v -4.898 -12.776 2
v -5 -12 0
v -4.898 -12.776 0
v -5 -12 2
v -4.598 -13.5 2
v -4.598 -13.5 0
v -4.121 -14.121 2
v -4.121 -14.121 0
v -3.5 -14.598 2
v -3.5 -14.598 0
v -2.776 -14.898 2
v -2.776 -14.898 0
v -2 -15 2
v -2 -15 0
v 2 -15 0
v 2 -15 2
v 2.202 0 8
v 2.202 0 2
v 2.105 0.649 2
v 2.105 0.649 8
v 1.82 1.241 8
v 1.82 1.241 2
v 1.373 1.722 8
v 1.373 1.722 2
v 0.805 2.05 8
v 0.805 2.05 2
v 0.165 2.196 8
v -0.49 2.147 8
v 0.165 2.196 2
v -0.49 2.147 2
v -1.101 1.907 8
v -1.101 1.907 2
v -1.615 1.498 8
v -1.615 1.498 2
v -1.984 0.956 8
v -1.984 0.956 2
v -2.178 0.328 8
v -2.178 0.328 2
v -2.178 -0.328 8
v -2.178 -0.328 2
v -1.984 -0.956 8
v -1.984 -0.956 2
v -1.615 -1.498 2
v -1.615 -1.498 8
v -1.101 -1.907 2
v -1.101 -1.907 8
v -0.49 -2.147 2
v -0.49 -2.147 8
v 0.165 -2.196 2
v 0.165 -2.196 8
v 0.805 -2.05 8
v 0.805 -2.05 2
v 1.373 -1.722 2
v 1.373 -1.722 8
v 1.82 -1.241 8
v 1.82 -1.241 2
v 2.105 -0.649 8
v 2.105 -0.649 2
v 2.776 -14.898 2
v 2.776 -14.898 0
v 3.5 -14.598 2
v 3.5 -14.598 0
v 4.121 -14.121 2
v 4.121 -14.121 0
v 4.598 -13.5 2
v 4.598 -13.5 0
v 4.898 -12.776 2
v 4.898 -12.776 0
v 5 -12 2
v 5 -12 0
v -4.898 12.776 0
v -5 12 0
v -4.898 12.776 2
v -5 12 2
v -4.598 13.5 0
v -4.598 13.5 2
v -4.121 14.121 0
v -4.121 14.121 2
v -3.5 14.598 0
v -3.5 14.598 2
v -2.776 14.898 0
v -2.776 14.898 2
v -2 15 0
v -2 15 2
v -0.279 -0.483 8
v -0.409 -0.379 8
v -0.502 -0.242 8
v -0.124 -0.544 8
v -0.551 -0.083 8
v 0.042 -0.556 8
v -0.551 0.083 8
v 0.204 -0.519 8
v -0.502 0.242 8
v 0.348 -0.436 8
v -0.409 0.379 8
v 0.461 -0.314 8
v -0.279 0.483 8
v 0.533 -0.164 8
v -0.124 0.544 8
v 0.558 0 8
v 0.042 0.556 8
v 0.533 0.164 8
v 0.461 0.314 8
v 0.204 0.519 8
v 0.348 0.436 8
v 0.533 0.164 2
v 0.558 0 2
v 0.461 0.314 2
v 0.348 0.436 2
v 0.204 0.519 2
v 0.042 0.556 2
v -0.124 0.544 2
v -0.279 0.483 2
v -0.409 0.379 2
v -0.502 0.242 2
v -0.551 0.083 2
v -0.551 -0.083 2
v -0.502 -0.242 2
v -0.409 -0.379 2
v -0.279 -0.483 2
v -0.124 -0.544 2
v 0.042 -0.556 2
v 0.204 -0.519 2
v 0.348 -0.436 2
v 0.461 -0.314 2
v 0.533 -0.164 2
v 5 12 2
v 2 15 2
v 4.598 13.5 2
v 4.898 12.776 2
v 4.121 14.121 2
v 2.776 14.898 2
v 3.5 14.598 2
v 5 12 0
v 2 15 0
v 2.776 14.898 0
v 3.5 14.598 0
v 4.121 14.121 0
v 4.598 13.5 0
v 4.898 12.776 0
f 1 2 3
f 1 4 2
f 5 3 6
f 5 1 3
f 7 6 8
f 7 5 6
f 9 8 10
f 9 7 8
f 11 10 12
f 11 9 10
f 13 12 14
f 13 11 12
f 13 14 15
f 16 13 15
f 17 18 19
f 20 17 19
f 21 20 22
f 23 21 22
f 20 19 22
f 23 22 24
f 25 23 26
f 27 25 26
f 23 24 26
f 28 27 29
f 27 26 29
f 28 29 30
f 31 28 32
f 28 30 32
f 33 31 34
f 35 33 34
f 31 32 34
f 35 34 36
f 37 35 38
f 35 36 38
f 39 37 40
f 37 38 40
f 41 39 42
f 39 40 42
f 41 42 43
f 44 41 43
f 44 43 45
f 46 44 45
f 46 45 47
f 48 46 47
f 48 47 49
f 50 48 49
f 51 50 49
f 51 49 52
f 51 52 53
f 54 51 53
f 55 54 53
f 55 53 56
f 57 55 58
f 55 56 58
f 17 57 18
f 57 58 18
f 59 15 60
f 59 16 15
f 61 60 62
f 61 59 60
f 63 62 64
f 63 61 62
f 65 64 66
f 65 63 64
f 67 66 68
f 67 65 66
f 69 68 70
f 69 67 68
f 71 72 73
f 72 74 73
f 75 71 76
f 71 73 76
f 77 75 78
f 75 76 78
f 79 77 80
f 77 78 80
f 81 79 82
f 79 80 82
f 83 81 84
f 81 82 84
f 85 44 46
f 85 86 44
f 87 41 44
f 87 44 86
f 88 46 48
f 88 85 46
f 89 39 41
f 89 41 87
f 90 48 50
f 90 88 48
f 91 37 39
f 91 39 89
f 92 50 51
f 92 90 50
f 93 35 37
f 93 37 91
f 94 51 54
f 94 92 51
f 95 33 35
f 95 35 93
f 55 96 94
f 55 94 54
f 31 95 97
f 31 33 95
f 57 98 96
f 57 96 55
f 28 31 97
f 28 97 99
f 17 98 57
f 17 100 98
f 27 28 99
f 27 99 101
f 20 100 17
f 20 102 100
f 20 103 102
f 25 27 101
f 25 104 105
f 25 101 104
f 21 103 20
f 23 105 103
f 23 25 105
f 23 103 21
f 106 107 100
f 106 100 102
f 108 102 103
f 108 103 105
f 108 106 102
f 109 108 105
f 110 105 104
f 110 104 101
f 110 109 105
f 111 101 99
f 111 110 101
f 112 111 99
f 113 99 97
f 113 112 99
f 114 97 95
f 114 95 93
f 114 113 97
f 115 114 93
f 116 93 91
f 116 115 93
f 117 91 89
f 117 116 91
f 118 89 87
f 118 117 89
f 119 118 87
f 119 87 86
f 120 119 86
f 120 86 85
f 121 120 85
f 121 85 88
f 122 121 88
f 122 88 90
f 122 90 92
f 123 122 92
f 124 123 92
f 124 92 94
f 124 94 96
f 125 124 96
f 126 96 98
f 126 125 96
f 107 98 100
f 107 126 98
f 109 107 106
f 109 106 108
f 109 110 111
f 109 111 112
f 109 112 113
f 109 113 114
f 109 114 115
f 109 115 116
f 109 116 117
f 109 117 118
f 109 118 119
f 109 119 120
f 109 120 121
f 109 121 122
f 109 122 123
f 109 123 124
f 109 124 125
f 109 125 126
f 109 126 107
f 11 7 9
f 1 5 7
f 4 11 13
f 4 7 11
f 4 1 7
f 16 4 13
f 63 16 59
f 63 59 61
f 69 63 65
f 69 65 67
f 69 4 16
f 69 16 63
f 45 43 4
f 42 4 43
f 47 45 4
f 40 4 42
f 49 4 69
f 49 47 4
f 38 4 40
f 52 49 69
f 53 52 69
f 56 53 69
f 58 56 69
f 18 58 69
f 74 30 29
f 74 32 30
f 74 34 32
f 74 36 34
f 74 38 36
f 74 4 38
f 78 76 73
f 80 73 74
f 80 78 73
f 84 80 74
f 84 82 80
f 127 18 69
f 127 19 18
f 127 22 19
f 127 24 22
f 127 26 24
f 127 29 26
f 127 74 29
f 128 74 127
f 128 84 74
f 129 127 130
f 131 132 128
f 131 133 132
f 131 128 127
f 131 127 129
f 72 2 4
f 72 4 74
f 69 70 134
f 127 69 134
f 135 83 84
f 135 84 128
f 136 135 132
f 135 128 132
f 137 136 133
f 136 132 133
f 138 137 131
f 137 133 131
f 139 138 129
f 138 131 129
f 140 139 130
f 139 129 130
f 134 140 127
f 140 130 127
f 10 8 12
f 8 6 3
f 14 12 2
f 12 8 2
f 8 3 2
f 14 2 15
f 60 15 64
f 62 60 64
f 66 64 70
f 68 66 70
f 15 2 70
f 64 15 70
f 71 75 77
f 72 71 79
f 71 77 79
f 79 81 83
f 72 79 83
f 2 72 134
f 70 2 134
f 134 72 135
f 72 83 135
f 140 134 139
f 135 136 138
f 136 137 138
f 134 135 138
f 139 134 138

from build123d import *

# Parameters (mm, degrees)
F0_W     = 10
F0_H     = 30
F1_DEPTH = 2
F2_R     = 2.202482
F2_R_2   = 0.557721
F3_DEPTH = 6
F4_R     = 3


with BuildPart() as f1:
    # F0 (on Top) → F1 (new body)
    with BuildSketch(Plane.XY):
        Rectangle(F0_W, F0_H)
    extrude(amount=F1_DEPTH)

    # F2 (on face) → F3 (join)
    with BuildSketch(Plane.XY.offset(2)):
        Circle(F2_R)
        Circle(F2_R_2, mode=Mode.SUBTRACT)
    extrude(amount=F3_DEPTH)

    # F4
    f4_edges = [f1.edges().sort_by_distance(p)[0] for p in [
        (5, 15, 1),
        (5, -15, 1),
        (-5, -15, 1),
        (-5, 15, 1),
    ]]
    fillet(f4_edges, radius=F4_R)


solid = f1.part
